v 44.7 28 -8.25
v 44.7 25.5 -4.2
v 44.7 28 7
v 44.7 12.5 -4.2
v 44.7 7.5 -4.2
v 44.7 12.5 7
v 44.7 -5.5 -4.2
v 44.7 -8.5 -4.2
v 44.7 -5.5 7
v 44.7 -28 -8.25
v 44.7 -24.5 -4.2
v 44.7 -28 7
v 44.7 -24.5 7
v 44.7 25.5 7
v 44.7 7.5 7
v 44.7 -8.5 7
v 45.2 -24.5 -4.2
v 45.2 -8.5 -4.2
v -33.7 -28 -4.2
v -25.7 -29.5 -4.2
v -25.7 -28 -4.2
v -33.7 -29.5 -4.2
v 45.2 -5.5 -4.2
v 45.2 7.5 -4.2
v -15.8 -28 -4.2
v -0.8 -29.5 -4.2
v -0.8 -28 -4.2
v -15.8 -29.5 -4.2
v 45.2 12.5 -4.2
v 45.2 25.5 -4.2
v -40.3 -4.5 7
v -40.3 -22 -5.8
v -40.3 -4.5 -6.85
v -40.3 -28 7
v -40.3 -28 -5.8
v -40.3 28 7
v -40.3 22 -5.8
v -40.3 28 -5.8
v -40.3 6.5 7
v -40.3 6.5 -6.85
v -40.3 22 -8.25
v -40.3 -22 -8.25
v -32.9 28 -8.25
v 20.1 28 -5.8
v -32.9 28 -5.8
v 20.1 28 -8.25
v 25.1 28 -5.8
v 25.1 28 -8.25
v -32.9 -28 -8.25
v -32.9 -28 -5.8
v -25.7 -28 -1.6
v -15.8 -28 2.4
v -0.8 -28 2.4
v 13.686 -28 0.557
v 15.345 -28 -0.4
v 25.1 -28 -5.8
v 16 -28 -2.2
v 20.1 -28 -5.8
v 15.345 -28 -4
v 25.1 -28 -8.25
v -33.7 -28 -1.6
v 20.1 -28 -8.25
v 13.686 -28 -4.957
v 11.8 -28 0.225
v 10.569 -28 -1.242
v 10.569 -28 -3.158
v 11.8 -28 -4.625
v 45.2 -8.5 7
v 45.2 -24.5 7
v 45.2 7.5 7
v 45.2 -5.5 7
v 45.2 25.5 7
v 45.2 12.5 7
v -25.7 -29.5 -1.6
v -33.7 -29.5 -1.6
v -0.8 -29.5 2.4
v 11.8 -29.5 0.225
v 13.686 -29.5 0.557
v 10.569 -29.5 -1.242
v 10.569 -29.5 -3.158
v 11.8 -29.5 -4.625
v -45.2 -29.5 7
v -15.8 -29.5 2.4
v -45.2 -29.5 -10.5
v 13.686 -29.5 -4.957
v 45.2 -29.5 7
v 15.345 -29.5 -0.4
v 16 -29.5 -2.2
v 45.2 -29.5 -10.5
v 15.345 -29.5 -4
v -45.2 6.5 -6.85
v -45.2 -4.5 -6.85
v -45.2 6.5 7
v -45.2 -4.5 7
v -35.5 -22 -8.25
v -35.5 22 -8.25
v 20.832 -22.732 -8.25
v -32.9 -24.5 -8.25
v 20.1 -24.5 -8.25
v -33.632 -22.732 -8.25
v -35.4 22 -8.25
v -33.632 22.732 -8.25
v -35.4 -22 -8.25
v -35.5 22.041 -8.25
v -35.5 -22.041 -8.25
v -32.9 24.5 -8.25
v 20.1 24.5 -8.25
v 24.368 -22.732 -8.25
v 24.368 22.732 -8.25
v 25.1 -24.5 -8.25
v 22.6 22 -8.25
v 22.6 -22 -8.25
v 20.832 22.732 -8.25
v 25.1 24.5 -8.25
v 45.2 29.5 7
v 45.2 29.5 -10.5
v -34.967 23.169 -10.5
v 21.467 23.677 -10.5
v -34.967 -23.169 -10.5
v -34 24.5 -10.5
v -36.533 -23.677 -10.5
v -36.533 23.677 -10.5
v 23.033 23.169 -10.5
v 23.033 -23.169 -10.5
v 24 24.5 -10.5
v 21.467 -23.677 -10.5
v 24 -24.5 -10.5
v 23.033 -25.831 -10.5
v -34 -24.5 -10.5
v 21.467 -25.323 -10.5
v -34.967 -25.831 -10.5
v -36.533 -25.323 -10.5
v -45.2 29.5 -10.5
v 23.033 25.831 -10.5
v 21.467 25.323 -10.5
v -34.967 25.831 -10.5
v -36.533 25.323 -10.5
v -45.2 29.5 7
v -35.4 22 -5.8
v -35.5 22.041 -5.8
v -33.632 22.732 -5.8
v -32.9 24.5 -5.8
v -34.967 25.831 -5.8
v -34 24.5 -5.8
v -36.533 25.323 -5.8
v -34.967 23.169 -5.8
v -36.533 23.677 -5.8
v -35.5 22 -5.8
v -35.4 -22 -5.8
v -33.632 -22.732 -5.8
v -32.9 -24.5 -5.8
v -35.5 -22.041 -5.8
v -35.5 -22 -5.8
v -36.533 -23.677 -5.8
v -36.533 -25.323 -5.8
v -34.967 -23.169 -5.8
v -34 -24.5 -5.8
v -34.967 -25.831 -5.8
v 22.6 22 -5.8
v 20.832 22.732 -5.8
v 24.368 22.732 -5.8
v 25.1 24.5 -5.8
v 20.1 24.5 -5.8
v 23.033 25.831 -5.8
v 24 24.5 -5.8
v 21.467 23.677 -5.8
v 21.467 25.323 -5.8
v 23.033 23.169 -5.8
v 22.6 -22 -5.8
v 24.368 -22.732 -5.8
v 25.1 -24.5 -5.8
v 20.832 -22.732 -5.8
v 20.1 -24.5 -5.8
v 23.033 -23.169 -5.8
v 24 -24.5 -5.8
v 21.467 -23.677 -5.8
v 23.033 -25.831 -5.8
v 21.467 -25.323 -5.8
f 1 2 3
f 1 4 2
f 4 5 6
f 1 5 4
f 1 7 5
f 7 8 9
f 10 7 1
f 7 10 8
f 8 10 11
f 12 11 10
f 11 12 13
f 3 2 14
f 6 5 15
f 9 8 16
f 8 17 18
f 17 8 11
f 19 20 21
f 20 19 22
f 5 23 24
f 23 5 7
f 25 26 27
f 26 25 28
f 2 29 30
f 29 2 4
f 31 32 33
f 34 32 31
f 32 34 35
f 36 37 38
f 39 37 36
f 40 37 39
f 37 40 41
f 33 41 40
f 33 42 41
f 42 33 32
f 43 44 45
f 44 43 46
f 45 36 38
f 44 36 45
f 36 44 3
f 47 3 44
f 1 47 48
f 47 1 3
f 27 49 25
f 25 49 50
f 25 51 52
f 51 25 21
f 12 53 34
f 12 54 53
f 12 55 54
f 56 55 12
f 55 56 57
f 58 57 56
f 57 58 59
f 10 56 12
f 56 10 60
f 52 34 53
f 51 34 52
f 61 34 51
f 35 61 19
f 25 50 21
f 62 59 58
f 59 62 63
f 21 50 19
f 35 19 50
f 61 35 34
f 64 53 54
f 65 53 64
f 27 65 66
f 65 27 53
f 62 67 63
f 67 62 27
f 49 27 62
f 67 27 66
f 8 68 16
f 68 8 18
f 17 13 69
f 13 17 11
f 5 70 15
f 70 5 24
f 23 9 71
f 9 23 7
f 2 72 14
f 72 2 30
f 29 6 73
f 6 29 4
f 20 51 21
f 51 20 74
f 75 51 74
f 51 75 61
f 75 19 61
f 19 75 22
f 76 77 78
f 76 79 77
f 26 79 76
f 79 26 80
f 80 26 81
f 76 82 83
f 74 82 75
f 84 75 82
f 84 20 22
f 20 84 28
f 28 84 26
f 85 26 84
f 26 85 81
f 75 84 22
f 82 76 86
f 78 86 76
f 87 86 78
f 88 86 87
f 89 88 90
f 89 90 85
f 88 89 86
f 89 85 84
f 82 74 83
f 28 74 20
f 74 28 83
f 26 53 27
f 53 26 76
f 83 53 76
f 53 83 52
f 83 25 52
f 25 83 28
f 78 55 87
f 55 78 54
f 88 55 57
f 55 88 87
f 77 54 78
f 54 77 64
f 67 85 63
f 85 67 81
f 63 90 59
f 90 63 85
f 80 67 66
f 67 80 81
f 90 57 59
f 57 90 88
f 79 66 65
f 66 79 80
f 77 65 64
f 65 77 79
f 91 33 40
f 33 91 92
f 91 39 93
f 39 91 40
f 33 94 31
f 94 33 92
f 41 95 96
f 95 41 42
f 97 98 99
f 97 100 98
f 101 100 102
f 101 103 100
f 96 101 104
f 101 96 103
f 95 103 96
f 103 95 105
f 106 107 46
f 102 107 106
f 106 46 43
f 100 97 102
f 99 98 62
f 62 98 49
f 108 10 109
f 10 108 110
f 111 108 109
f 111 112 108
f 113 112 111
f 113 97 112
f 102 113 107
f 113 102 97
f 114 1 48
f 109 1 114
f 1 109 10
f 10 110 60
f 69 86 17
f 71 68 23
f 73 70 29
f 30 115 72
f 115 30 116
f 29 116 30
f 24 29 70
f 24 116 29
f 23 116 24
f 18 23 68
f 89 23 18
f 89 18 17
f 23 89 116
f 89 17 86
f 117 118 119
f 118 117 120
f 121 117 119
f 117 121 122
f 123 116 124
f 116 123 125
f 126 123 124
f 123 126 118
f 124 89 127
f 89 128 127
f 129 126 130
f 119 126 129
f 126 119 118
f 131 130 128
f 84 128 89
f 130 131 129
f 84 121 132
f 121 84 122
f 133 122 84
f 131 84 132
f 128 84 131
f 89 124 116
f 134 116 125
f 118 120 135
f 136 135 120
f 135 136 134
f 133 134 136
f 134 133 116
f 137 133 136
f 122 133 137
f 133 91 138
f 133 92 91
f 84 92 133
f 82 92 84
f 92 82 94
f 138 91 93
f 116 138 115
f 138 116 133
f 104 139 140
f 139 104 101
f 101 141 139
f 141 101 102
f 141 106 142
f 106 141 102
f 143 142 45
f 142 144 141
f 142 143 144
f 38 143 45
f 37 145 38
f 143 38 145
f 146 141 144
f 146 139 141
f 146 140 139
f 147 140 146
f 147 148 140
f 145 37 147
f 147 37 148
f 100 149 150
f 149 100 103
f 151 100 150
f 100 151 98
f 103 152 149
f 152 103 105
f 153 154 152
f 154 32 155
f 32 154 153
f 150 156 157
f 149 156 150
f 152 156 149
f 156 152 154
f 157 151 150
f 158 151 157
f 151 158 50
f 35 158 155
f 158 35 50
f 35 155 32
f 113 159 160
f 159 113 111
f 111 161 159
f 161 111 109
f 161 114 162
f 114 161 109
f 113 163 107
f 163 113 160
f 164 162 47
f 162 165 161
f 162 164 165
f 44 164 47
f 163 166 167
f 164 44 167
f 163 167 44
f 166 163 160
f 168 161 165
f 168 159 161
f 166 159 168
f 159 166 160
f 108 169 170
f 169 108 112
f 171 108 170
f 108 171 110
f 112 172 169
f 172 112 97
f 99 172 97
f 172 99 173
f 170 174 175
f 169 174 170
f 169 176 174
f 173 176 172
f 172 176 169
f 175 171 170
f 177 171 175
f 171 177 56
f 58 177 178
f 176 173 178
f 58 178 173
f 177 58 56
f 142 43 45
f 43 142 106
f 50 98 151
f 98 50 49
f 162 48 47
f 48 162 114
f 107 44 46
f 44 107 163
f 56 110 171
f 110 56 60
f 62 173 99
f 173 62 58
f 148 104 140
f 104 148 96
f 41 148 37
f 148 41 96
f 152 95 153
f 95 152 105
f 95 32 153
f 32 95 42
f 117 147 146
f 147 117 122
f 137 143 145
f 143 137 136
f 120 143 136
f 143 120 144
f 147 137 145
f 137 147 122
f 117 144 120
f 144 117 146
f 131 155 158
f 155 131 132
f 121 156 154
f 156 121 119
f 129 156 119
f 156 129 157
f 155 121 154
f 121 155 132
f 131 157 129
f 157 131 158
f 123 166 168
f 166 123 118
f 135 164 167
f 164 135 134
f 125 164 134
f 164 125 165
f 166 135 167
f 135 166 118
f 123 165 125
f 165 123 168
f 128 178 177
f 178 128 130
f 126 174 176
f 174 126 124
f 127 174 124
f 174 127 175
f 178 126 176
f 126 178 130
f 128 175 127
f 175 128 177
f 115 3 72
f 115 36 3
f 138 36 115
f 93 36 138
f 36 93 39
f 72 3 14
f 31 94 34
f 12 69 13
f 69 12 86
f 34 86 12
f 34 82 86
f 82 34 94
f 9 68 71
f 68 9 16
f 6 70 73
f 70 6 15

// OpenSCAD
//Diameter of the spotting scope eyepiece in mm.
ssd = 51.6; //[20.001:0.001:150.000]

//This switch sets the quality of the compiled design for printing or just mucking about.
final = 1; //[1:final, 0:draft]

//Select what you want the code to output.
part = 1; //[0:All in one model, 1: Just the RasPi case, 2: Just the camera housing, 3: Just the clamp]

support = 0; //[0: No supports, 1: Supports on clamp]

/*
LunAero Scoped Camera Adapter

This is the adapter for the Raspberry Pi camera to be attached to a spotting scope.
Parametric design is formatted for Thingiverse and MakerBot Customizer format.  Each setting is
    configurable in these programs.  Manual editing of these values can be performed by directly
    editing the OpenSCAD code, where variables are listed above this text.
This design can be configured to produce a single model of the combined part as it should be assembled
    (useful for computer models and sintered 3D printing), or as individual parts which are to be glued
    together (useful for fused filament 3D printing).  This is selected by a drop-down menu type variable.
Supports can be enabled with a drop-down menu type variable.  These supports are rudimentary, and designed to provide only the bare minimum to print successfully without relying on automatic generation of supports by a slicing program (which might mess up parts with tight tolerances.  If you are not confident in these supports, it is recommended to turn them off and generate your own with a slicing program.

Designs by Dr. Wesley Honeycutt in collaboration with Dr. Eli Bridge
*/

//if (final == 0) {
//    $fs = 0.5;
//    $fa = 10;
//}
//else if (final == 1) {
//    $fs = 0.1;
//    $fa = 1;
//}
//else {
//    echo("<font color='red'>Error: The output quality setting has an incorrect value.</font>");
//}

// Global resolution
//$fs = 0.5;  // Don't generate smaller facets than 0.1 mm
//$fa = 10;    // Don't generate larger angles than 5 degrees

// Sanitize ssd input
if (ssd <= 20) {
    echo("<font color='red'>Error: Minimum eyepiece size is 20 mm for this design.</font>")
    assert(false);
}

module raspi() {
    /*
    Measurements borrowed in part from SaarBastler
    See repo for info:
    https://github.com/saarbastler/library.scad
    */
    color("red") {
        union() {
            cube([85,56,1.6], center=true);
            
            //Ethernet Port
            translate([23.5,-24.5,0.8]) cube([21,16,13.8]);
            
            //USB Ports
            translate([27.5,-5.5 ,0.8]) cube([17,13,15.5]);
            translate([27.5,12.5,0.8]) cube([17,13,15.5]);
            
            //micro USB Port
            translate([-35.9,-29.5,0.8]) cube([8,6,2.6]);
            
            //HDMI Port
            translate([-18,-29.5,0.8]) cube([15,11.5,6.6]);
            
            //Phono Jack
            translate([7.5,-28,0.8]) cube([7,13,5.6]);
            translate([11,-28,2.8]) rotate([90,0,0]) cylinder(d=5.6,h=2);
            
            //Display
            translate([-41.4,-14.5,0.8]) cube([4,22,5.5]);
            
            //Camera
            translate([0.5,-26.9,0.8]) cube([4,22,5.5]);
            
            //SD Card
            translate([-42.5,-6,-2.1]) cube([13,14,1.5]);
            translate([-44.9,-4.5,-1.85]) cube([2.4,11,1]);
            
            //Header (SaarBastler design)
            translate([3.5-85/2+29-10*2.54,49/2-2.54,0.8]) cube([50.8,5.08,1.27]);
            translate([3.5-85/2+29-10*2.54,49/2-2.54,0.8]) for(x=[0:19],y=[0:1])
                translate([x*2.54+(1.27+.6)/2,y*2.54+(1.27+.6)/2,-3.5]) cube([0.6,0.6,11.5]);
        }
    }
}

//This module blocks off the top and bottom of the raspi
//for simplification of diff'd void.
module raspiblock() {
    union() {
        raspi();
        translate([0,0,6.5]) cube([85,56,19.5], center = true);
        translate([-50.9,-4.5,-1.85]) cube([12.4,11,18.1]);
    }
}

//This module makes a cube and cuts out a space for the blocked Raspberry Pi.
module body() {
    difference() {
        union() {
            difference() {
                cube([90.4,59,21], center=true);
                translate([2.2,0,-5]) raspiblock();
            }
            //Standoffs are added for the screw holes.
            translate([-35.4,24.5,-8.25]) cylinder(d = 5, h = 2.45);
            translate([-35.4,-24.5,-8.25]) cylinder(d = 5, h = 2.45);
            translate([22.6,24.5,-8.25]) cylinder(d = 5, h = 2.45);
            translate([22.6,-24.5,-8.25]) cylinder(d = 5, h = 2.45);
            //these cubes make the filleted type of standoff
            translate([-37.9,24.5,-8.25]) cube([5,5,2.45]);
            translate([-37.9,-29.5,-8.25]) cube([5,5,2.45]);
            translate([20.1,24.5,-8.25]) cube([5,5,2.45]);
            translate([20.1,-29.5,-8.25]) cube([5,5,2.45]);
            translate([-40.5,22,-8.25]) cube([5,7.5,2.45]);
            translate([-40.5,-29.5,-8.25]) cube([5,7.5,2.45]);
        }
        //These are the drill holes through the body for mounting bolts.
        translate([-35.4,24.5,-19.25]) cylinder(d=2.8, h=30);
        translate([-35.4,-24.5,-19.25]) cylinder(d=2.8, h=30);
        translate([22.6,24.5,-19.25]) cylinder(d=2.8, h=30);
        translate([22.6,-24.5,-19.25]) cylinder(d=2.8, h=30);
        translate([0,0,12]) cube([100,100,10], center = true);
    }
}

//This module provides a design for the Raspberry Pi camera module
//Some measurements taken from larch
//see https://github.com/larsch/openscad-modules/blob/master/rpi-camera.scad
module camera() {
    translate([-14.25,-12.5,0]) union() {
        // PCB
        cube([24,25,1]); 
        // Lens Assembly
        translate([10.25,8.5,1]) cube([8,8,3.25]);
        translate([14.25,12.5,4.25]) cylinder(d=7.5,h=1);
        translate([14.25,12.5,4.95]) cylinder(d=5.5,h=0.7);
        // Upper Lens Assembly
        translate([1.75,8.625,1]) cube([8.5,7.75,1.5]);
        // Flex Cable Mount
        translate([18.25,2.75,-2.75]) cube([4.5,19.5,2.75]);
        translate([22.75,2,-2.75]) cube([1.25,21,2.75]);
        // Flex Cable
        translate([24,4.25,-1]) cube([10,16.5,0.1]); 
    }
}

//This module makes a clamp for the spotting scope.
//This is parametric based on the "ssd" variable in line 2
module clamp() {
    union() {
        // Side 1 of clamp
        rotate(a=5, v=[0,0,ssd/2]) difference() {
            union() {
                // Outer Half-Ring
                translate([0,-ssd/50,0]) cylinder(d = ssd+4, h = 15);
                // Bolt holder
                difference() {
                    translate([-(ssd/2+15),-10,-2]) cube ([15,10,17]);
                    translate([-(ssd/2+15)+5.125,0,7.5]) rotate([90,0,0]) cylinder(d = 3.75, h = 10);
                }
            }
            // Inner Half-Ring 
            translate([0,-ssd/50,0]) cylinder(d = ssd, h = 15);
            translate([-(ssd+4),0,0]) cube([2*ssd+4,ssd/2+4,15]);
        }
        // Side 2 of clamp
        rotate(a=-5, v=[0,0,ssd/2]) difference() {
            union() {
                // Outer Half-Ring 2
                translate([0,ssd/50,0]) cylinder(d = ssd+4, h = 15);
                // Bolt holder 2
                difference() {
                    union() {
                        translate([-(ssd/2+15),2,0]) cube ([15,10,15]);
                        translate([-(ssd/2+15),2,-2]) cube ([12,10,2]);
                    }
                    translate([-(ssd/2+15)+5.125,12,7.5]) rotate([90,0,0]) cylinder(d = 3.75, h = 10);   
                }
            }
        // Inner Half-Ring 2
        translate([0,ssd/50,0]) cylinder(d = ssd, h = 15);
        translate([-(ssd+4)/2,-(ssd+4)/2,0]) cube([ssd+4,ssd/2+4,15]);
        // Cut for Flex
        translate([-(ssd+4)/2,0,0]) cube([ssd+4,ssd/2+4,1]);
        }
        // Camera hole and backing.  The cubes add alignment marks for camera holder.
        rotate(a=5, v=[0,0,ssd/2]) translate([0,-ssd/50,0]) difference() {
            translate([0,0,-2]) cylinder(d = ssd + 4, h = 2);
            translate ([0,0,-5.625]) camera(center=true);
            translate ([14.75,15.25,-1.75]) cube([1.5,0.5,0.5], center = true);
            translate ([15.25,14.75,-1.75]) cube([0.5,1.5,0.5], center = true);
            translate ([-14.75,15.25,-1.75]) cube([1.5,0.5,0.5], center = true);
            translate ([-15.25,14.75,-1.75]) cube([0.5,1.5,0.5], center = true);
            translate ([-14.75,-15.25,-1.75]) cube([1.5,0.5,0.5], center = true);
            translate ([-15.25,-14.75,-1.75]) cube([0.5,1.5,0.5], center = true);
            translate ([14.75,-15.25,-1.75]) cube([1.5,0.5,0.5], center = true);
            translate ([15.25,-14.75,-1.75]) cube([0.5,1.5,0.5], center = true);
        }
        // This places supports on the clamp edge
        if (support > 0) {
            rotate(a=-5, v=[0,0,ssd/2]) difference() {
                translate([0,ssd/50,-2]) cylinder(d = ssd+4, h = 4);
                translate([0,ssd/50,-2]) cylinder(d = ssd, h = 4);
                translate([-(ssd+4)/2,-(ssd+4)/2,-2]) cube([ssd+4,ssd/2+4,4]);
                translate([0,ssd/50,-2]) cylinder(d1 = ssd + 1,d = ssd + 4, h = 4);
                arclength = 2 * PI * ssd * 6;
                spoke = 2*(asin(1 / (2 * ssd)));
                echo("spoke = ",spoke);
            }
        }
    }
}

module cameraholder() {
    // Camera Block, aligns with side 1 of clamp
        union() {
            difference() {
                union() {
                    //%translate([0,0,-2]) cylinder(d = ssd + 4, h = 2);
                    translate([0,0,-3.475]) cube([30,30,3], center = true);
                    difference() {
                        translate([-12.5,0,-6]) cube([5,30,8], center = true);
                        translate([-11.25,0,-6.5]) rotate([0,45,0]) cube([5.5,25,4.5], center = true);
                    }
                }
                translate ([0,0,-5.625]) camera(center=true);
//                %polyhedron(
//                    points = [
//                        [0,0,0],
//                        [10,0,0],
//                        [10,5,0],
//                        [0,5,0],
//                        [0,5,3],
//                        [10,5,3]  
//                    ],
//                    faces = [
//                        [0,1,2,3],
//                        [5,4,3,2],
//                        [0,4,5,1],
//                        [0,3,4],
//                        [5,2,1]
//                    ]
//                );
            }
            translate([0,10.5,-5]) cylinder(d = 1.75, h = 1.5, center = true);
            translate([0,-10.5,-5]) cylinder(d = 1.75, h = 1.5, center = true);
            translate([0,13.75,-6]) cube([30,2.5,8], center = true);
            translate([0,-13.75,-6]) cube([30,2.5,8], center = true);
        }
}

//This module puts everything together
module finalbody() {
    union() {
        body();
        rotate(5, v=[0,0,ssd/2]) {
            rotate([0,180,0]) translate([0,0,20]) clamp();
            rotate([0,180,0]) translate([0,0,20]) 
            rotate(a=5, v=[0,0,ssd/2]) translate([0,-ssd/50,0]) cameraholder();
        }
    }
}

if  (part == 0) {
    render() finalbody();
}
else if (part == 1) {
    render() body();
}
else if (part == 2) {
    render() cameraholder();
}
else if (part == 3) {
    render() clamp();
}
else {
    echo("<font color='red'>Error: You must select a valid part to print</font>")
    assert(false);
}
